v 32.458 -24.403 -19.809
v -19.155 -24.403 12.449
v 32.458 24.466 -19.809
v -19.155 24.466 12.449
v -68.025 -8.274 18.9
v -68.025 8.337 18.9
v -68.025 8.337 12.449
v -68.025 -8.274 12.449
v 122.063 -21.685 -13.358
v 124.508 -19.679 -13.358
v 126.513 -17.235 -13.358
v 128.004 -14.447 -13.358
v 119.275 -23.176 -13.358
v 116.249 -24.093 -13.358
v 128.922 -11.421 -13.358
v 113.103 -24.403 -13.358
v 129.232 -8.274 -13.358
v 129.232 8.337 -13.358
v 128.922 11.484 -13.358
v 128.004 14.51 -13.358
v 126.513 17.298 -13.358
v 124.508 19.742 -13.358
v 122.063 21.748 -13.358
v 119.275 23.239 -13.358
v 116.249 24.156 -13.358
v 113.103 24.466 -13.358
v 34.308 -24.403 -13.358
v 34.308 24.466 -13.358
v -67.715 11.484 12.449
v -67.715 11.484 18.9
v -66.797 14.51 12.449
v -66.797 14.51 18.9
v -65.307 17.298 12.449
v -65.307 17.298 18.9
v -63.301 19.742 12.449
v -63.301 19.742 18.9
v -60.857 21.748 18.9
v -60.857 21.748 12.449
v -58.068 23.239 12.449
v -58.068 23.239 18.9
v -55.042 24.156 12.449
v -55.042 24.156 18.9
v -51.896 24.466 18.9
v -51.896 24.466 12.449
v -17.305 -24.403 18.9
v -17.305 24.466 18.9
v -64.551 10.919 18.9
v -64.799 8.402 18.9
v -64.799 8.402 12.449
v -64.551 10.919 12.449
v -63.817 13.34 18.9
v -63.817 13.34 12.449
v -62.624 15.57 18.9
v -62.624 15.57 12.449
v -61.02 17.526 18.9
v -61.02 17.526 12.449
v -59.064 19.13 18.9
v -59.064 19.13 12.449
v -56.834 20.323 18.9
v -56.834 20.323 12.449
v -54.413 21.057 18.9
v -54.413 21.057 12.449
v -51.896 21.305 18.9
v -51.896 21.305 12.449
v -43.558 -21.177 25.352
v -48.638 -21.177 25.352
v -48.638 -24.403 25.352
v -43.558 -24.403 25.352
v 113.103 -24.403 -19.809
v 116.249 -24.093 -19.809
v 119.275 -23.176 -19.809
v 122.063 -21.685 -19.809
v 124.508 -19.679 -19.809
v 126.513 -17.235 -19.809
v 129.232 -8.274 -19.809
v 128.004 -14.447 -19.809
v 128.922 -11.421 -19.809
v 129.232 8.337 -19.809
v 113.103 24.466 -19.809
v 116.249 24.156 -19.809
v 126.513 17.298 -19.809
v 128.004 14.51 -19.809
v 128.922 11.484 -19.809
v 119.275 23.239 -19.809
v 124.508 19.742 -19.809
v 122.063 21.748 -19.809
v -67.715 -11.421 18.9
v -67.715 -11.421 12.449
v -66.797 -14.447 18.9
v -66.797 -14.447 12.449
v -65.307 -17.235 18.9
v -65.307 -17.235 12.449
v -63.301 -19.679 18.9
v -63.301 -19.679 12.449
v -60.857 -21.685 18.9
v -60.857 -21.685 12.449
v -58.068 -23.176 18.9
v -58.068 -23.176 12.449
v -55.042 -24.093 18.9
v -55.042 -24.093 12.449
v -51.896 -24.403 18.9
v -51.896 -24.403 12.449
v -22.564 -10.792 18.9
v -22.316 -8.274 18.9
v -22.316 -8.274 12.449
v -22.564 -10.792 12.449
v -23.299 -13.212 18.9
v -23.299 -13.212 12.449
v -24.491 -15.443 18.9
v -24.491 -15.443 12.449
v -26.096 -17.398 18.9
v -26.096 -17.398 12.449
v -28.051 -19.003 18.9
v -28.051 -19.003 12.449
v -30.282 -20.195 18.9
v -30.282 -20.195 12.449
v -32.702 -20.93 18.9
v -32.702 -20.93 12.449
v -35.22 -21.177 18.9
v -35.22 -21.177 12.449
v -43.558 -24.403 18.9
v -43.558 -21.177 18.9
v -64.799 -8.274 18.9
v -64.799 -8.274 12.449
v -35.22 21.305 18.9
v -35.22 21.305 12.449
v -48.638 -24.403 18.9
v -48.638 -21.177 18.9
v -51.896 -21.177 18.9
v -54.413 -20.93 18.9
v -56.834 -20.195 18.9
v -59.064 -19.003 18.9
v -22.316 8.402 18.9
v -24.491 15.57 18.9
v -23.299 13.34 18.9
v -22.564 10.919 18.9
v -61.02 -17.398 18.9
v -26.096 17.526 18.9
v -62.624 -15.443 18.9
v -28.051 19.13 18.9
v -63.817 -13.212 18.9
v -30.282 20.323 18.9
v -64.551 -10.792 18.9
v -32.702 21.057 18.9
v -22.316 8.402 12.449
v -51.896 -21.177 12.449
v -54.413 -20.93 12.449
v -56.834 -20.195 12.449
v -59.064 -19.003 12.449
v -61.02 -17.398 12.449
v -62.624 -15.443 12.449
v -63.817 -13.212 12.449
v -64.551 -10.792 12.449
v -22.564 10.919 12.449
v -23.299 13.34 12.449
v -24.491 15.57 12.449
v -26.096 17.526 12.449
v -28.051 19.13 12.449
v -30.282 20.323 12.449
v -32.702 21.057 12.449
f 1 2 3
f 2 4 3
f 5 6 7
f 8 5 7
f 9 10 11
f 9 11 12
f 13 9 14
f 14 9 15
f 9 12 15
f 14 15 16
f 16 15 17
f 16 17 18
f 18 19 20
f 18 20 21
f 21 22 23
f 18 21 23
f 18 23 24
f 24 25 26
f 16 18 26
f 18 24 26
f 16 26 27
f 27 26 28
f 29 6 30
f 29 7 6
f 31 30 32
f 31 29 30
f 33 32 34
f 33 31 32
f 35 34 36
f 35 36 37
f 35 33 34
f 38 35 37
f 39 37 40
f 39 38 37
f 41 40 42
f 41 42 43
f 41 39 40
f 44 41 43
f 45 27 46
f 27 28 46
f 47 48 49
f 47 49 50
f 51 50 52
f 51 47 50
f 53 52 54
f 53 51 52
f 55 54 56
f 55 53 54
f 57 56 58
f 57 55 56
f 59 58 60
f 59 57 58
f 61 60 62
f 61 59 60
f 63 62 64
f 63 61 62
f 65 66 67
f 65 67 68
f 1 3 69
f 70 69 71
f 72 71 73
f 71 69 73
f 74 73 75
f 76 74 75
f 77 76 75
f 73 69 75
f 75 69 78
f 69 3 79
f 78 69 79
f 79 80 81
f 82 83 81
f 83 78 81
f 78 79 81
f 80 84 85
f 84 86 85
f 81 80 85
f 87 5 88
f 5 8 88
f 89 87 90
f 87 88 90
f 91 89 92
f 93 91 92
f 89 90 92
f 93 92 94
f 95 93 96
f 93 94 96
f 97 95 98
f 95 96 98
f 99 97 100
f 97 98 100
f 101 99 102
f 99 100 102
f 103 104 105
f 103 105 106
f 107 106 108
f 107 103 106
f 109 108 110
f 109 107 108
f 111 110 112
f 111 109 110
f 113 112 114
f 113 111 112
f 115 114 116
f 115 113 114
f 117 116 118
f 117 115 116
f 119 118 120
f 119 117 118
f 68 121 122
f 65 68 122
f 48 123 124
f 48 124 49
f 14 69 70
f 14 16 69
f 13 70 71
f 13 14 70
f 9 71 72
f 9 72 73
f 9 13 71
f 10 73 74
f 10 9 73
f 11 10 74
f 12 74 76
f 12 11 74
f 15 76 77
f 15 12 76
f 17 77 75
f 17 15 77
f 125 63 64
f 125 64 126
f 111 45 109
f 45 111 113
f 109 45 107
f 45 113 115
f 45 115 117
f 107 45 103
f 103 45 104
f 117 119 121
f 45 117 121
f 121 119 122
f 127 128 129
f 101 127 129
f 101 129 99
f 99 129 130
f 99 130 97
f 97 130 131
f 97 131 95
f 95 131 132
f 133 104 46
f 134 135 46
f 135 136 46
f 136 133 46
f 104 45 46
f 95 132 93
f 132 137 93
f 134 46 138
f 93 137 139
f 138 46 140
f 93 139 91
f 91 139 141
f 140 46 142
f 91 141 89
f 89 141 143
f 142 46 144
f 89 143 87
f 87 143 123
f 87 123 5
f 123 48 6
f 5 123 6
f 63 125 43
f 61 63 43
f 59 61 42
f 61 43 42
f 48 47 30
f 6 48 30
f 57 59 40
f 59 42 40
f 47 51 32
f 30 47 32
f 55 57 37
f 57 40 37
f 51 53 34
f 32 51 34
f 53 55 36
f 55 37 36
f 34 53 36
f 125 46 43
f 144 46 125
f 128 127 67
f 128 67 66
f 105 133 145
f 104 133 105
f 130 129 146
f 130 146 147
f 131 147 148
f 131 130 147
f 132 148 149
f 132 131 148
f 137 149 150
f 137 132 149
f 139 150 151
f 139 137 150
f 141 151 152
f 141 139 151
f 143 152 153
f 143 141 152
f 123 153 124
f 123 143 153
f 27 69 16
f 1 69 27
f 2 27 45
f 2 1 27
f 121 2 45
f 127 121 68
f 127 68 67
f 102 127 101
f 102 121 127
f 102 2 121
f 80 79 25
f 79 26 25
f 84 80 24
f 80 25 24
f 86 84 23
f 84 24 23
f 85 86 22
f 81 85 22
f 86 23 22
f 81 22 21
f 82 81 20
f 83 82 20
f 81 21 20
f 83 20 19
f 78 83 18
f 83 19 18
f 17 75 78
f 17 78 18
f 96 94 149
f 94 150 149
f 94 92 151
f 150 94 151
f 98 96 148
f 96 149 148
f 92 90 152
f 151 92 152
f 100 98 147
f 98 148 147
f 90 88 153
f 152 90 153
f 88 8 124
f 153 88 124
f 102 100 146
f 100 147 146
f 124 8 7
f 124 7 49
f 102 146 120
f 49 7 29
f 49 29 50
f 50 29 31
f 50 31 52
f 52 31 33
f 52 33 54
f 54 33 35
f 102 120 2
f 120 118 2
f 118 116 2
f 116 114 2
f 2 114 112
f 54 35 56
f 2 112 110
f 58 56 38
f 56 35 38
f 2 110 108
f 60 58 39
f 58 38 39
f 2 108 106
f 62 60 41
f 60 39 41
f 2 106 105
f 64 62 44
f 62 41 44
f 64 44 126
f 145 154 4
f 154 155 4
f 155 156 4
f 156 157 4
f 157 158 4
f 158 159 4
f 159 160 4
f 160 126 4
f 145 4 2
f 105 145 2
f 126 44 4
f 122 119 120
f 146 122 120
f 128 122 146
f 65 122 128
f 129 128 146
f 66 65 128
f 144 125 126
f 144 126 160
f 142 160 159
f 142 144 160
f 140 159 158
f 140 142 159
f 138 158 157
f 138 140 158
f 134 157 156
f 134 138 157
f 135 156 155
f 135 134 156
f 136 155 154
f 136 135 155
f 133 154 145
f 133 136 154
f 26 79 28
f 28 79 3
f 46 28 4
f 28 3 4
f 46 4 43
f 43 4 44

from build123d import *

# Parameters (mm, degrees)
EXTRUDE_THIN1_DEPTH = 9.62000108
CUT_EXTRUDE1_DEPTH  = 80.723760299
FILLET1_R           = 6.35
SKETCH4_W           = 2.00000108
SKETCH4_H           = 1.27
BOSS_EXTRUDE1_DEPTH = 2.54
SCALE1_SCALE        = 2.54


with BuildPart() as part:
    # Sketch2 → Extrude-Thin1 (new, symmetric)
    with BuildSketch(Plane(origin=(0, 0, 0), x_dir=(1, 0, 0), z_dir=(0, 1, 0))):
        Polygon((0, 0), (19.24000216, 0), (39.56000216, 12.7), (77.66000216, 12.7), (77.66000216, 10.16), (40.288464575, 10.16), (19.968464575, -2.54), (0, -2.54), align=None)
    extrude(amount=EXTRUDE_THIN1_DEPTH, both=True)

    # Sketch3 → Cut-Extrude1 (cut, through all)
    with BuildSketch(Plane.XY.offset(2.54)):
        with BuildLine():
            Line((6.35, 8.37540108), (12.91540216, 8.37540108))
            ThreePointArc((12.91540216, 8.37540108), (16.507504608, 6.887503528), (17.99540216, 3.29540108))
            Line((17.99540216, 3.29540108), (17.99540216, -3.27000108))
            ThreePointArc((17.99540216, -3.27000108), (16.507504608, -6.862103528), (12.91540216, -8.35000108))
            Line((12.91540216, -8.35000108), (6.35, -8.35000108))
            ThreePointArc((6.35, -8.35000108), (2.757897552, -6.862103528), (1.27, -3.27000108))
            Line((1.27, -3.27000108), (1.27, 3.29540108))
            ThreePointArc((1.27, 3.29540108), (2.757897552, 6.887503528), (6.35, 8.37540108))
        make_face()
    extrude(amount=-CUT_EXTRUDE1_DEPTH, mode=Mode.SUBTRACT)

    # Fillet1
    fillet1_edges = [part.edges().sort_by_distance(p)[0] for p in [
        (0, 9.62000108, 1.27),
        (0, -9.62000108, 1.27),
        (77.66000216, 9.62000108, -11.43),
        (77.66000216, -9.62000108, -11.43),
    ]]
    fillet(fillet1_edges, radius=FILLET1_R)

    # Sketch4 → Boss-Extrude1 (add)
    with BuildSketch(Plane.XY.offset(2.54)):
        with Locations((8.63270054, -8.98500108)):
            Rectangle(SKETCH4_W, SKETCH4_H)
    extrude(amount=BOSS_EXTRUDE1_DEPTH)


with BuildPart() as part_1:
    # Scale1: scaled about (44.171942925, -0.020471779, -8.083535651)
    add(part.part.scale(SCALE1_SCALE).moved(Location((-68.024792105, 0.03152654, 12.448644903))))


solid = part_1.part
